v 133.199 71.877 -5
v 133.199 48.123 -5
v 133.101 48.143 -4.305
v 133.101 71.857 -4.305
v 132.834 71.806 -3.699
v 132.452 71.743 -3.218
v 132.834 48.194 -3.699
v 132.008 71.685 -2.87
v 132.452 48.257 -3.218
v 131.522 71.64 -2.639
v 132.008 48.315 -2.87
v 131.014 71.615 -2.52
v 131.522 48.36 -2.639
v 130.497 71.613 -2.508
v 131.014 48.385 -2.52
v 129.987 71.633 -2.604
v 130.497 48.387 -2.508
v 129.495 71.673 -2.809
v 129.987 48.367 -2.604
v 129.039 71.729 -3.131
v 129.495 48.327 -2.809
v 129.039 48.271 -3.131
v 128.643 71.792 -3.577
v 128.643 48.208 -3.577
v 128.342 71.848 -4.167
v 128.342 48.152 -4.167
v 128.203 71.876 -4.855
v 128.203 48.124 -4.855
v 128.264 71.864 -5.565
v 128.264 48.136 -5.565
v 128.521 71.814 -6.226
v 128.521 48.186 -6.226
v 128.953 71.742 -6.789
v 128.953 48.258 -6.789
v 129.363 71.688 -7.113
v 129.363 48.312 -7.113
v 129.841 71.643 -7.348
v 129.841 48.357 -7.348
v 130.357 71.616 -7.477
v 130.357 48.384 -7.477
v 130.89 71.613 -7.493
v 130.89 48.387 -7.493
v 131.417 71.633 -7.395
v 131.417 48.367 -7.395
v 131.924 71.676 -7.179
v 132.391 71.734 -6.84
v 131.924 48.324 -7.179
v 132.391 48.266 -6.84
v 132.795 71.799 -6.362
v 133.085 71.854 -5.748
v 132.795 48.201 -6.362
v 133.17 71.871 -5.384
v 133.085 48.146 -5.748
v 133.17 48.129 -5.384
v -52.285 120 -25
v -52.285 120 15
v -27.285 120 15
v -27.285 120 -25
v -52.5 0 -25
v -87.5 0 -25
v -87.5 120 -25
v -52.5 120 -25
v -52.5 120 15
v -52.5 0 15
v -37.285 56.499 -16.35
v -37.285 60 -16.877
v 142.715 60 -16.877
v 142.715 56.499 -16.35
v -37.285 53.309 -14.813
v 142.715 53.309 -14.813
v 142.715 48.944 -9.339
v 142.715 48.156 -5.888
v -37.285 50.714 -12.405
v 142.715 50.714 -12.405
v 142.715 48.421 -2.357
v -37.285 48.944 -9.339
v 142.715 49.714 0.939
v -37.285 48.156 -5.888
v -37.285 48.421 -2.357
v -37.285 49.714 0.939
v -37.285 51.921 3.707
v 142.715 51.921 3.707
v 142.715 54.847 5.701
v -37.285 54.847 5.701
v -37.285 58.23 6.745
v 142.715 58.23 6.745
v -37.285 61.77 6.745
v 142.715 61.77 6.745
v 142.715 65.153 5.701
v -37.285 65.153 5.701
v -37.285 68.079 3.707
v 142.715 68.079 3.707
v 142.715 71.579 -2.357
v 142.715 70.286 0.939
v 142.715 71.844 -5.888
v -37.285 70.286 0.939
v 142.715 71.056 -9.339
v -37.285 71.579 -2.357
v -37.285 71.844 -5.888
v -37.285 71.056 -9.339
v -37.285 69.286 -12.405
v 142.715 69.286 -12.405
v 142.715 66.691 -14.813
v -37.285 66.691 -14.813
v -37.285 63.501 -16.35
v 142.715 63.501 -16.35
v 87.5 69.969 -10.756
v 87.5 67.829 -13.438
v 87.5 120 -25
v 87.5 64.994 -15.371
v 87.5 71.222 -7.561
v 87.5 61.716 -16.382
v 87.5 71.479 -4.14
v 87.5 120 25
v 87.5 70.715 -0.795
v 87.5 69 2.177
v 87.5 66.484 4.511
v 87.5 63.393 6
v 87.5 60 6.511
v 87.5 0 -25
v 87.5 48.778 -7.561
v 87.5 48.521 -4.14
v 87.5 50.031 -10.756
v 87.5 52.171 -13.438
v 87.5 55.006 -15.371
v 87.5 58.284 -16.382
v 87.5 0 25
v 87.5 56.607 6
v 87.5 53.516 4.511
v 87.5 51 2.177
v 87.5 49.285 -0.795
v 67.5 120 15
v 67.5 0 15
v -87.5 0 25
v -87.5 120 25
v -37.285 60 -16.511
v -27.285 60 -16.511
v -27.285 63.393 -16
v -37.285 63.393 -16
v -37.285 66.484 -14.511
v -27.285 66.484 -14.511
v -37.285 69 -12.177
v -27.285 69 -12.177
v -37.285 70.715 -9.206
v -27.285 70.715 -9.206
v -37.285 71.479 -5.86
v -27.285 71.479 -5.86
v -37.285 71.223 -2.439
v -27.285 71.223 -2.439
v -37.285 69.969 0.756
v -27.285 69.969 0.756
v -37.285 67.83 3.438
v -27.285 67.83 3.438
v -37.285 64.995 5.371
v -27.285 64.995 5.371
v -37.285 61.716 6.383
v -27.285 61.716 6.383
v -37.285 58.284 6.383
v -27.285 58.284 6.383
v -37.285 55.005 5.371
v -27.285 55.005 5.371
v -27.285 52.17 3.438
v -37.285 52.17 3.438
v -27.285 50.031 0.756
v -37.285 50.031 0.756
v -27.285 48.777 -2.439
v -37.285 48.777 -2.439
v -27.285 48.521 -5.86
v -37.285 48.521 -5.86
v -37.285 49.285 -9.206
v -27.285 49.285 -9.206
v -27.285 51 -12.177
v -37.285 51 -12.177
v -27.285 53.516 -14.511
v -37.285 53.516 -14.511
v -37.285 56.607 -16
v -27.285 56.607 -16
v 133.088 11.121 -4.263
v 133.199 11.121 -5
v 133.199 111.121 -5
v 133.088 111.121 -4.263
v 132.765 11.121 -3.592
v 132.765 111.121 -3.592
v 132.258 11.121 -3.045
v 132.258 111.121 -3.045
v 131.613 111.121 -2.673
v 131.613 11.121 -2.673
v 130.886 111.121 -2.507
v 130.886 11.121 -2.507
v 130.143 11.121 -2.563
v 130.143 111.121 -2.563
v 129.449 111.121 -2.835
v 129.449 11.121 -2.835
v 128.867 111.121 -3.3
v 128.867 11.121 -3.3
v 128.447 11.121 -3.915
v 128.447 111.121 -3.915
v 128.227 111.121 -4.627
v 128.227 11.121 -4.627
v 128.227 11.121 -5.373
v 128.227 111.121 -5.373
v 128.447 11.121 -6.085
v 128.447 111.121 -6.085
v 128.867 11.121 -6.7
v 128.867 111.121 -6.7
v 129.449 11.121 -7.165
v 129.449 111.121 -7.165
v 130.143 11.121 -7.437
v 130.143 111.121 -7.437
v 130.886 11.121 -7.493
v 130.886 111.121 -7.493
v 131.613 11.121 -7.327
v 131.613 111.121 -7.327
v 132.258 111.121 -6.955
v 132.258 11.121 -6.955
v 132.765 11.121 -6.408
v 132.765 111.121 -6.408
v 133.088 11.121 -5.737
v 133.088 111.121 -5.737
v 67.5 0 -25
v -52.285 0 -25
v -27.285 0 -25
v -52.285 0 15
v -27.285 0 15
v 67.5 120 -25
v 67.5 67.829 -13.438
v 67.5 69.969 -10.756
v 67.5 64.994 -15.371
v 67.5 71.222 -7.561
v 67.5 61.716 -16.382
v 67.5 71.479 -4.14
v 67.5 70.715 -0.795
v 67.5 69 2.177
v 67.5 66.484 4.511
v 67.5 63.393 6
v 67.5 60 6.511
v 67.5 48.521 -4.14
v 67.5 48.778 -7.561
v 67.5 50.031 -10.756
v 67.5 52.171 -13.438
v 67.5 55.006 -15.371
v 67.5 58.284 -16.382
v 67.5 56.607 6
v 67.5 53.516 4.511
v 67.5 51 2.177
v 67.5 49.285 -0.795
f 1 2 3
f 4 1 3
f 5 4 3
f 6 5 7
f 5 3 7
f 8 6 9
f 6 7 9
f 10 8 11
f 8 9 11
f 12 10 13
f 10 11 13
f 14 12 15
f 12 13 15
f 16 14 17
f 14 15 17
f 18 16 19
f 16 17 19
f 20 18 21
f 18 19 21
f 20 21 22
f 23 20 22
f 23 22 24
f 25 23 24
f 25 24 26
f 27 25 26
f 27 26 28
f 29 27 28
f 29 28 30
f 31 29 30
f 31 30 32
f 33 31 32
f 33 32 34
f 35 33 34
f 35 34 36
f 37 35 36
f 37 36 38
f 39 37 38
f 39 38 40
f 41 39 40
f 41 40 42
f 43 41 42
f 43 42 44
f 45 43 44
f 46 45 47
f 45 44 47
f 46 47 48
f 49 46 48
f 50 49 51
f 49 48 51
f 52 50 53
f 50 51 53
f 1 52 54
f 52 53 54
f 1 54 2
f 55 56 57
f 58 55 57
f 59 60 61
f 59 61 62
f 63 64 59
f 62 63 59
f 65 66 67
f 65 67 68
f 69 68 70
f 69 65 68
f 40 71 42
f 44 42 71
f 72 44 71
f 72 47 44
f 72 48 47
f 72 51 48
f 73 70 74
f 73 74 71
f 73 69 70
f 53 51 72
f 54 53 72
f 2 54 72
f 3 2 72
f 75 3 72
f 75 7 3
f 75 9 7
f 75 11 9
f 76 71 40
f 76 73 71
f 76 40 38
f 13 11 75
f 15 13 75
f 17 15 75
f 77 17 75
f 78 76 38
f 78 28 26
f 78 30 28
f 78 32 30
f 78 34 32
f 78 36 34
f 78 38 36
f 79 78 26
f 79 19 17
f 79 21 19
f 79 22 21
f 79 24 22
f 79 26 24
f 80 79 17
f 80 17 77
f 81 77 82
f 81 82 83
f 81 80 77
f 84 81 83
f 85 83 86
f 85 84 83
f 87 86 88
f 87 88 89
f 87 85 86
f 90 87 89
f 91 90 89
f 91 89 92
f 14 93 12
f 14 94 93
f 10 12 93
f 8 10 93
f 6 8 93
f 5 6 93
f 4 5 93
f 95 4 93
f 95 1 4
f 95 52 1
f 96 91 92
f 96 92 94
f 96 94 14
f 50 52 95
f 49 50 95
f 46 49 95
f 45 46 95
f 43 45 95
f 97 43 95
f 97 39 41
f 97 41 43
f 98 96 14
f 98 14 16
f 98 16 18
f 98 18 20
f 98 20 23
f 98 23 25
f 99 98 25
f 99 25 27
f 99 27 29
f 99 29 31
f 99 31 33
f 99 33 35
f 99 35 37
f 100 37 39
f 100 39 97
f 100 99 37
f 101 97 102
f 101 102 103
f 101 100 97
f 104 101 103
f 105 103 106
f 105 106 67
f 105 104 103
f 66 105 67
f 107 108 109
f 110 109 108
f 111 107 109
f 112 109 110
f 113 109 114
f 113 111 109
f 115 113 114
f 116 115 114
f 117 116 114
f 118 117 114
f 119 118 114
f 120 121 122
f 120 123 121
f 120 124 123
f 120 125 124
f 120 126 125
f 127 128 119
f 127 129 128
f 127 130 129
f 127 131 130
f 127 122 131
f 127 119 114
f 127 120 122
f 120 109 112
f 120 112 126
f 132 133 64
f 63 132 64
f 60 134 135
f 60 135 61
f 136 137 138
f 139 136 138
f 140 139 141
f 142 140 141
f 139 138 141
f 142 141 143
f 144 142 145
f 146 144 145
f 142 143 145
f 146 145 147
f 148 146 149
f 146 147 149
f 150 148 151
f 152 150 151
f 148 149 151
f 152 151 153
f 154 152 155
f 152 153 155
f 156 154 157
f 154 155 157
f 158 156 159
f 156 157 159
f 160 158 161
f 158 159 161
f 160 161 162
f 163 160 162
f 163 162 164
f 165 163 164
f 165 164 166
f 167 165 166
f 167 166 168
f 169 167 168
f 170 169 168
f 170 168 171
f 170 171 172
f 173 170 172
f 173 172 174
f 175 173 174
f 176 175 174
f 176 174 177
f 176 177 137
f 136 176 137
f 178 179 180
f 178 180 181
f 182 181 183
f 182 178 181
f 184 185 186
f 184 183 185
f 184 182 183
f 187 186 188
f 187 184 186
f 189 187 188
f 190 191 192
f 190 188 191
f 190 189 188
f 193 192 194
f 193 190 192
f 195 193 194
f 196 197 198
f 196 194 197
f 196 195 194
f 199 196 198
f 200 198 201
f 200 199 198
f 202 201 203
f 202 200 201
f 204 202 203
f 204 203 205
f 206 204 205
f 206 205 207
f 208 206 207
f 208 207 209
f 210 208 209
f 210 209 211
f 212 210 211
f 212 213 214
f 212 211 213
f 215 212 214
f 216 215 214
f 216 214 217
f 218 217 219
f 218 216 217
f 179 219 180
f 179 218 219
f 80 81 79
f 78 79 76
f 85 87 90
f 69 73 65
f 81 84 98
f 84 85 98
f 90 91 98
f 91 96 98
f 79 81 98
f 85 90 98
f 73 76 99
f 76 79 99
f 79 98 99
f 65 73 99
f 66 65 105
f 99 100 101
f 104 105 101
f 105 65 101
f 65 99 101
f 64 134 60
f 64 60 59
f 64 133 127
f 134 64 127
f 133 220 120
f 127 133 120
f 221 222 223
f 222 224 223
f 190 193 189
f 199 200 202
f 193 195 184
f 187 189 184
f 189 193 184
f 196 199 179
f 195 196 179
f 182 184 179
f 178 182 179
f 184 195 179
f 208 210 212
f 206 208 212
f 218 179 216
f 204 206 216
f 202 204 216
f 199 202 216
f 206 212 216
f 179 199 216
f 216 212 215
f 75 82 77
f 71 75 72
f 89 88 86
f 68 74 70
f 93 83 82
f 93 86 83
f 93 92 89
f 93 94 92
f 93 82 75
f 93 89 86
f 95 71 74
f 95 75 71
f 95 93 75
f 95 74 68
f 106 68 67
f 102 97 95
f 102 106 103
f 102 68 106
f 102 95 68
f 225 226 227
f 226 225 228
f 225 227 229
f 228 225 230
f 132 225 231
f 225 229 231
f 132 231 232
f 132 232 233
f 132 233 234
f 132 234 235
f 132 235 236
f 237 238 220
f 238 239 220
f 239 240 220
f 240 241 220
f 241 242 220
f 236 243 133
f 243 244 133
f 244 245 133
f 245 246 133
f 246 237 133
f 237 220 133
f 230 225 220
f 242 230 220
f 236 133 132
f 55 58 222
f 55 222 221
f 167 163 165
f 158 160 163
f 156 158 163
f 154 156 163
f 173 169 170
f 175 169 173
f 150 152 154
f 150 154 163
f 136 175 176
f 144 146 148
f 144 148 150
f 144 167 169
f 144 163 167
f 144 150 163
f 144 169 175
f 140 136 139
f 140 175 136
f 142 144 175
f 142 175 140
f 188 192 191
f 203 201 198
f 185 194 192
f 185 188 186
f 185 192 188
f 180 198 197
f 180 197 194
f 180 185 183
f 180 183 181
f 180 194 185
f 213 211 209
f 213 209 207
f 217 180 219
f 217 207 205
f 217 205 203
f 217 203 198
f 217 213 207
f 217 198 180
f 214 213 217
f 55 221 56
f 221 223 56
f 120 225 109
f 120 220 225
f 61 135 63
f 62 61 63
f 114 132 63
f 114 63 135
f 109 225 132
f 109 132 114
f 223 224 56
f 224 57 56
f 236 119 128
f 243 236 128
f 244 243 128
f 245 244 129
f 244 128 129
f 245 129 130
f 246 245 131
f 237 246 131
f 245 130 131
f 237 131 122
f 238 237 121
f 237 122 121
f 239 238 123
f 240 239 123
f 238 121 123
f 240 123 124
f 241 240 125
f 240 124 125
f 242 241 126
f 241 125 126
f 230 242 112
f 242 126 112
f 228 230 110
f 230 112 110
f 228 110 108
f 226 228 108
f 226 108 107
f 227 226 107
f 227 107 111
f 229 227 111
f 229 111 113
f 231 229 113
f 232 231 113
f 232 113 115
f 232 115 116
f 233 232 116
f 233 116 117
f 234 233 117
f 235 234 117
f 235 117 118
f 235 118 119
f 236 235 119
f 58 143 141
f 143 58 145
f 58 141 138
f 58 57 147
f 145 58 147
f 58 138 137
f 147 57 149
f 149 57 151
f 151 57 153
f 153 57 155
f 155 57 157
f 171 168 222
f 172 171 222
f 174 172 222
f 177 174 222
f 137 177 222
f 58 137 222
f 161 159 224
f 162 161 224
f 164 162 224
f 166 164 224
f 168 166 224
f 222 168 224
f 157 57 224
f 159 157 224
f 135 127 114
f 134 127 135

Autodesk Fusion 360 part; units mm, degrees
sketch "Sketch1" plane through (0, 0, 0) normal (0, 1, 0) x (1, 0, 0) in component "ViceBody"
  line L0 (87.5, -25) -> (-87.5, -25)
  line L1 (-87.5, -25) -> (-87.5, 25)
  line L2 (87.5, 25) -> (87.5, -25)
  line L3 (67.5, 25) -> (67.5, -15)
  line L4 (67.5, -15) -> (-52.5, -15)
  line L5 (-52.5, -15) -> (-52.5, 25)
  line L6 (-87.5, 25) -> (-52.5, 25)
  line L7 (67.5, 25) -> (87.5, 25)
  dimension "d1" = 175
  dimension "d2" = 50
  dimension "d3" = 40
  dimension "d4" = 35
  dimension "d5" = 20
  dimension "d6" = 25
  dimension "d7" = 87.5
extrude "Extrude1" add sketch "Sketch1" along normal blind 120 makes body 1
sketch "Sketch1 (2)" plane through (0, 0, 15) normal (0, 0, -1) x (-1, 0, 0) in component "ViceSlide"
  line L0 (-67.5, 0) -> (52.5, 0)
  line L1 (52.5, 0) -> (52.5, 120)
  line L2 (52.5, 120) -> (-67.5, 120)
  line L3 (-67.5, 120) -> (-67.5, 0)
  line L4 (52.5, 120) -> (27.5, 120)
  line L5 (27.5, 120) -> (27.5, 0)
  line L6 (27.5, 0) -> (52.5, 0)
  line L7 (52.5, 0) -> (52.5, 120)
  point P0 (52.5, 120)
  dimension "d10" = 25
extrude "Extrude1'" add sketch "Sketch1 (2)" along normal blind 40 separate body contours L0 L1 L2 L4 L5 L6 L7 makes body 2 in component "ViceSlide"
sketch "Sketch1 (3)" plane through (67.5, 0, 0) normal (-1, 0, 0) x (0, 0, 1)
  line L0 (-25, 0) -> (15, 0)
  line L1 (15, 0) -> (15, 120)
  line L2 (15, 120) -> (-25, 120)
  line L3 (-25, 120) -> (-25, 0)
  point P0 (-5, 60)
  dimension "d13" = 20
  dimension "d14" = 60
hole "Hole1" at (67.5, 60, -5) direction (1, 0, 0) diameter 23.022 end up to surface (20 mm away) bodies 1
thread "Thread1" "ISO Metric profile 25.0 M25x2 6H"
sketch "Sketch2" plane through (-27.5, 0, 0) normal (1, 0, 0) x (0, 0, -1) in component "ViceSlide"
  line L0 (-15, 120) -> (-15, 0)
  line L1 (-15, 0) -> (25, 0)
  line L2 (25, 0) -> (25, 120)
  line L3 (25, 120) -> (-15, 120)
  circle A0 centre (5, 60) radius 11.5112
extrude "Extrude2" cut sketch "Sketch2" against normal blind 10 contours A0 bodies 2 in component "ViceSlide"
sketch "Sketch1 (4)" plane through (-27.5, 0, 0) normal (1, 0, 0) x (0, 0, -1) in component "Rod"
  circle A0 centre (5, 60) radius 11.5112
  line L0 (-15, 120) -> (-15, 0)
  line L1 (-15, 0) -> (25, 0)
  line L2 (25, 0) -> (25, 120)
  line L3 (25, 120) -> (-15, 120)
  circle A1 centre (5, 60) radius 11.5112
extrude "Extrude1''" add sketch "Sketch1 (4)" along normal blind 180 separate body contours A0 A1 makes body 3 in component "Rod"
thread "Thread1'" "ISO Metric profile 24.0 M24x3 4g6g" major diameter 23.7545 minor diameter 20.367 pitch 3 angle 60 resizes the face on face at (92.5, 59.4262, -16.4969) from (-22.5, 60, -5) to (127.5, 60, -5) on bodies 3 in component "Rod"
ref_plane "WorkPlane1" through (140.4841, 48.1227, -5) normal (0, -1, 0) x (0, 0, 1) in component "Rod"
sketch "Sketch2 (2)" plane through (140.4841, 48.1227, -5) normal (0, -1, 0) x (1, 0, 0) in component "Rod"
  circle A0 centre (0, 0) radius 2.5
  dimension "d25" = 5
extrude "Extrude2'" cut sketch "Sketch2 (2)" against normal blind 24 bodies 3 in component "Rod"
sketch "Sketch1 (5)" plane through (0, 0, 0) normal (0, 1, 0) x (1, 0, 0) in component "Pin"
  circle A0 centre (0, 0) radius 2.5
  dimension "d28" = 5
extrude "Extrude1'''" add sketch "Sketch1 (5)" along normal blind 100 separate body makes body 4 in component "Pin"
copy_body "CutPasteBodies1" bodies 1 removing the originals makes body 5 in component "ViceBody"
component "ViceBody" placed x (1, 0, 0) y (0, 1, 0) z (0, 0, 1) at (0, 0, 0)
component "ViceSlide" placed x (1, 0, 0) y (0, 1, 0) z (0, 0, 1) at (0.2151, 0, 0)
component "Rod" placed x (1, 0, 0) y (0, 1, 0) z (0, 0, 1) at (-9.7849, 0, 0)
component "Pin" placed x (1, 0, 0) y (0, 1, 0) z (0, 0, 1) at (130.6992, 11.121, -5)
